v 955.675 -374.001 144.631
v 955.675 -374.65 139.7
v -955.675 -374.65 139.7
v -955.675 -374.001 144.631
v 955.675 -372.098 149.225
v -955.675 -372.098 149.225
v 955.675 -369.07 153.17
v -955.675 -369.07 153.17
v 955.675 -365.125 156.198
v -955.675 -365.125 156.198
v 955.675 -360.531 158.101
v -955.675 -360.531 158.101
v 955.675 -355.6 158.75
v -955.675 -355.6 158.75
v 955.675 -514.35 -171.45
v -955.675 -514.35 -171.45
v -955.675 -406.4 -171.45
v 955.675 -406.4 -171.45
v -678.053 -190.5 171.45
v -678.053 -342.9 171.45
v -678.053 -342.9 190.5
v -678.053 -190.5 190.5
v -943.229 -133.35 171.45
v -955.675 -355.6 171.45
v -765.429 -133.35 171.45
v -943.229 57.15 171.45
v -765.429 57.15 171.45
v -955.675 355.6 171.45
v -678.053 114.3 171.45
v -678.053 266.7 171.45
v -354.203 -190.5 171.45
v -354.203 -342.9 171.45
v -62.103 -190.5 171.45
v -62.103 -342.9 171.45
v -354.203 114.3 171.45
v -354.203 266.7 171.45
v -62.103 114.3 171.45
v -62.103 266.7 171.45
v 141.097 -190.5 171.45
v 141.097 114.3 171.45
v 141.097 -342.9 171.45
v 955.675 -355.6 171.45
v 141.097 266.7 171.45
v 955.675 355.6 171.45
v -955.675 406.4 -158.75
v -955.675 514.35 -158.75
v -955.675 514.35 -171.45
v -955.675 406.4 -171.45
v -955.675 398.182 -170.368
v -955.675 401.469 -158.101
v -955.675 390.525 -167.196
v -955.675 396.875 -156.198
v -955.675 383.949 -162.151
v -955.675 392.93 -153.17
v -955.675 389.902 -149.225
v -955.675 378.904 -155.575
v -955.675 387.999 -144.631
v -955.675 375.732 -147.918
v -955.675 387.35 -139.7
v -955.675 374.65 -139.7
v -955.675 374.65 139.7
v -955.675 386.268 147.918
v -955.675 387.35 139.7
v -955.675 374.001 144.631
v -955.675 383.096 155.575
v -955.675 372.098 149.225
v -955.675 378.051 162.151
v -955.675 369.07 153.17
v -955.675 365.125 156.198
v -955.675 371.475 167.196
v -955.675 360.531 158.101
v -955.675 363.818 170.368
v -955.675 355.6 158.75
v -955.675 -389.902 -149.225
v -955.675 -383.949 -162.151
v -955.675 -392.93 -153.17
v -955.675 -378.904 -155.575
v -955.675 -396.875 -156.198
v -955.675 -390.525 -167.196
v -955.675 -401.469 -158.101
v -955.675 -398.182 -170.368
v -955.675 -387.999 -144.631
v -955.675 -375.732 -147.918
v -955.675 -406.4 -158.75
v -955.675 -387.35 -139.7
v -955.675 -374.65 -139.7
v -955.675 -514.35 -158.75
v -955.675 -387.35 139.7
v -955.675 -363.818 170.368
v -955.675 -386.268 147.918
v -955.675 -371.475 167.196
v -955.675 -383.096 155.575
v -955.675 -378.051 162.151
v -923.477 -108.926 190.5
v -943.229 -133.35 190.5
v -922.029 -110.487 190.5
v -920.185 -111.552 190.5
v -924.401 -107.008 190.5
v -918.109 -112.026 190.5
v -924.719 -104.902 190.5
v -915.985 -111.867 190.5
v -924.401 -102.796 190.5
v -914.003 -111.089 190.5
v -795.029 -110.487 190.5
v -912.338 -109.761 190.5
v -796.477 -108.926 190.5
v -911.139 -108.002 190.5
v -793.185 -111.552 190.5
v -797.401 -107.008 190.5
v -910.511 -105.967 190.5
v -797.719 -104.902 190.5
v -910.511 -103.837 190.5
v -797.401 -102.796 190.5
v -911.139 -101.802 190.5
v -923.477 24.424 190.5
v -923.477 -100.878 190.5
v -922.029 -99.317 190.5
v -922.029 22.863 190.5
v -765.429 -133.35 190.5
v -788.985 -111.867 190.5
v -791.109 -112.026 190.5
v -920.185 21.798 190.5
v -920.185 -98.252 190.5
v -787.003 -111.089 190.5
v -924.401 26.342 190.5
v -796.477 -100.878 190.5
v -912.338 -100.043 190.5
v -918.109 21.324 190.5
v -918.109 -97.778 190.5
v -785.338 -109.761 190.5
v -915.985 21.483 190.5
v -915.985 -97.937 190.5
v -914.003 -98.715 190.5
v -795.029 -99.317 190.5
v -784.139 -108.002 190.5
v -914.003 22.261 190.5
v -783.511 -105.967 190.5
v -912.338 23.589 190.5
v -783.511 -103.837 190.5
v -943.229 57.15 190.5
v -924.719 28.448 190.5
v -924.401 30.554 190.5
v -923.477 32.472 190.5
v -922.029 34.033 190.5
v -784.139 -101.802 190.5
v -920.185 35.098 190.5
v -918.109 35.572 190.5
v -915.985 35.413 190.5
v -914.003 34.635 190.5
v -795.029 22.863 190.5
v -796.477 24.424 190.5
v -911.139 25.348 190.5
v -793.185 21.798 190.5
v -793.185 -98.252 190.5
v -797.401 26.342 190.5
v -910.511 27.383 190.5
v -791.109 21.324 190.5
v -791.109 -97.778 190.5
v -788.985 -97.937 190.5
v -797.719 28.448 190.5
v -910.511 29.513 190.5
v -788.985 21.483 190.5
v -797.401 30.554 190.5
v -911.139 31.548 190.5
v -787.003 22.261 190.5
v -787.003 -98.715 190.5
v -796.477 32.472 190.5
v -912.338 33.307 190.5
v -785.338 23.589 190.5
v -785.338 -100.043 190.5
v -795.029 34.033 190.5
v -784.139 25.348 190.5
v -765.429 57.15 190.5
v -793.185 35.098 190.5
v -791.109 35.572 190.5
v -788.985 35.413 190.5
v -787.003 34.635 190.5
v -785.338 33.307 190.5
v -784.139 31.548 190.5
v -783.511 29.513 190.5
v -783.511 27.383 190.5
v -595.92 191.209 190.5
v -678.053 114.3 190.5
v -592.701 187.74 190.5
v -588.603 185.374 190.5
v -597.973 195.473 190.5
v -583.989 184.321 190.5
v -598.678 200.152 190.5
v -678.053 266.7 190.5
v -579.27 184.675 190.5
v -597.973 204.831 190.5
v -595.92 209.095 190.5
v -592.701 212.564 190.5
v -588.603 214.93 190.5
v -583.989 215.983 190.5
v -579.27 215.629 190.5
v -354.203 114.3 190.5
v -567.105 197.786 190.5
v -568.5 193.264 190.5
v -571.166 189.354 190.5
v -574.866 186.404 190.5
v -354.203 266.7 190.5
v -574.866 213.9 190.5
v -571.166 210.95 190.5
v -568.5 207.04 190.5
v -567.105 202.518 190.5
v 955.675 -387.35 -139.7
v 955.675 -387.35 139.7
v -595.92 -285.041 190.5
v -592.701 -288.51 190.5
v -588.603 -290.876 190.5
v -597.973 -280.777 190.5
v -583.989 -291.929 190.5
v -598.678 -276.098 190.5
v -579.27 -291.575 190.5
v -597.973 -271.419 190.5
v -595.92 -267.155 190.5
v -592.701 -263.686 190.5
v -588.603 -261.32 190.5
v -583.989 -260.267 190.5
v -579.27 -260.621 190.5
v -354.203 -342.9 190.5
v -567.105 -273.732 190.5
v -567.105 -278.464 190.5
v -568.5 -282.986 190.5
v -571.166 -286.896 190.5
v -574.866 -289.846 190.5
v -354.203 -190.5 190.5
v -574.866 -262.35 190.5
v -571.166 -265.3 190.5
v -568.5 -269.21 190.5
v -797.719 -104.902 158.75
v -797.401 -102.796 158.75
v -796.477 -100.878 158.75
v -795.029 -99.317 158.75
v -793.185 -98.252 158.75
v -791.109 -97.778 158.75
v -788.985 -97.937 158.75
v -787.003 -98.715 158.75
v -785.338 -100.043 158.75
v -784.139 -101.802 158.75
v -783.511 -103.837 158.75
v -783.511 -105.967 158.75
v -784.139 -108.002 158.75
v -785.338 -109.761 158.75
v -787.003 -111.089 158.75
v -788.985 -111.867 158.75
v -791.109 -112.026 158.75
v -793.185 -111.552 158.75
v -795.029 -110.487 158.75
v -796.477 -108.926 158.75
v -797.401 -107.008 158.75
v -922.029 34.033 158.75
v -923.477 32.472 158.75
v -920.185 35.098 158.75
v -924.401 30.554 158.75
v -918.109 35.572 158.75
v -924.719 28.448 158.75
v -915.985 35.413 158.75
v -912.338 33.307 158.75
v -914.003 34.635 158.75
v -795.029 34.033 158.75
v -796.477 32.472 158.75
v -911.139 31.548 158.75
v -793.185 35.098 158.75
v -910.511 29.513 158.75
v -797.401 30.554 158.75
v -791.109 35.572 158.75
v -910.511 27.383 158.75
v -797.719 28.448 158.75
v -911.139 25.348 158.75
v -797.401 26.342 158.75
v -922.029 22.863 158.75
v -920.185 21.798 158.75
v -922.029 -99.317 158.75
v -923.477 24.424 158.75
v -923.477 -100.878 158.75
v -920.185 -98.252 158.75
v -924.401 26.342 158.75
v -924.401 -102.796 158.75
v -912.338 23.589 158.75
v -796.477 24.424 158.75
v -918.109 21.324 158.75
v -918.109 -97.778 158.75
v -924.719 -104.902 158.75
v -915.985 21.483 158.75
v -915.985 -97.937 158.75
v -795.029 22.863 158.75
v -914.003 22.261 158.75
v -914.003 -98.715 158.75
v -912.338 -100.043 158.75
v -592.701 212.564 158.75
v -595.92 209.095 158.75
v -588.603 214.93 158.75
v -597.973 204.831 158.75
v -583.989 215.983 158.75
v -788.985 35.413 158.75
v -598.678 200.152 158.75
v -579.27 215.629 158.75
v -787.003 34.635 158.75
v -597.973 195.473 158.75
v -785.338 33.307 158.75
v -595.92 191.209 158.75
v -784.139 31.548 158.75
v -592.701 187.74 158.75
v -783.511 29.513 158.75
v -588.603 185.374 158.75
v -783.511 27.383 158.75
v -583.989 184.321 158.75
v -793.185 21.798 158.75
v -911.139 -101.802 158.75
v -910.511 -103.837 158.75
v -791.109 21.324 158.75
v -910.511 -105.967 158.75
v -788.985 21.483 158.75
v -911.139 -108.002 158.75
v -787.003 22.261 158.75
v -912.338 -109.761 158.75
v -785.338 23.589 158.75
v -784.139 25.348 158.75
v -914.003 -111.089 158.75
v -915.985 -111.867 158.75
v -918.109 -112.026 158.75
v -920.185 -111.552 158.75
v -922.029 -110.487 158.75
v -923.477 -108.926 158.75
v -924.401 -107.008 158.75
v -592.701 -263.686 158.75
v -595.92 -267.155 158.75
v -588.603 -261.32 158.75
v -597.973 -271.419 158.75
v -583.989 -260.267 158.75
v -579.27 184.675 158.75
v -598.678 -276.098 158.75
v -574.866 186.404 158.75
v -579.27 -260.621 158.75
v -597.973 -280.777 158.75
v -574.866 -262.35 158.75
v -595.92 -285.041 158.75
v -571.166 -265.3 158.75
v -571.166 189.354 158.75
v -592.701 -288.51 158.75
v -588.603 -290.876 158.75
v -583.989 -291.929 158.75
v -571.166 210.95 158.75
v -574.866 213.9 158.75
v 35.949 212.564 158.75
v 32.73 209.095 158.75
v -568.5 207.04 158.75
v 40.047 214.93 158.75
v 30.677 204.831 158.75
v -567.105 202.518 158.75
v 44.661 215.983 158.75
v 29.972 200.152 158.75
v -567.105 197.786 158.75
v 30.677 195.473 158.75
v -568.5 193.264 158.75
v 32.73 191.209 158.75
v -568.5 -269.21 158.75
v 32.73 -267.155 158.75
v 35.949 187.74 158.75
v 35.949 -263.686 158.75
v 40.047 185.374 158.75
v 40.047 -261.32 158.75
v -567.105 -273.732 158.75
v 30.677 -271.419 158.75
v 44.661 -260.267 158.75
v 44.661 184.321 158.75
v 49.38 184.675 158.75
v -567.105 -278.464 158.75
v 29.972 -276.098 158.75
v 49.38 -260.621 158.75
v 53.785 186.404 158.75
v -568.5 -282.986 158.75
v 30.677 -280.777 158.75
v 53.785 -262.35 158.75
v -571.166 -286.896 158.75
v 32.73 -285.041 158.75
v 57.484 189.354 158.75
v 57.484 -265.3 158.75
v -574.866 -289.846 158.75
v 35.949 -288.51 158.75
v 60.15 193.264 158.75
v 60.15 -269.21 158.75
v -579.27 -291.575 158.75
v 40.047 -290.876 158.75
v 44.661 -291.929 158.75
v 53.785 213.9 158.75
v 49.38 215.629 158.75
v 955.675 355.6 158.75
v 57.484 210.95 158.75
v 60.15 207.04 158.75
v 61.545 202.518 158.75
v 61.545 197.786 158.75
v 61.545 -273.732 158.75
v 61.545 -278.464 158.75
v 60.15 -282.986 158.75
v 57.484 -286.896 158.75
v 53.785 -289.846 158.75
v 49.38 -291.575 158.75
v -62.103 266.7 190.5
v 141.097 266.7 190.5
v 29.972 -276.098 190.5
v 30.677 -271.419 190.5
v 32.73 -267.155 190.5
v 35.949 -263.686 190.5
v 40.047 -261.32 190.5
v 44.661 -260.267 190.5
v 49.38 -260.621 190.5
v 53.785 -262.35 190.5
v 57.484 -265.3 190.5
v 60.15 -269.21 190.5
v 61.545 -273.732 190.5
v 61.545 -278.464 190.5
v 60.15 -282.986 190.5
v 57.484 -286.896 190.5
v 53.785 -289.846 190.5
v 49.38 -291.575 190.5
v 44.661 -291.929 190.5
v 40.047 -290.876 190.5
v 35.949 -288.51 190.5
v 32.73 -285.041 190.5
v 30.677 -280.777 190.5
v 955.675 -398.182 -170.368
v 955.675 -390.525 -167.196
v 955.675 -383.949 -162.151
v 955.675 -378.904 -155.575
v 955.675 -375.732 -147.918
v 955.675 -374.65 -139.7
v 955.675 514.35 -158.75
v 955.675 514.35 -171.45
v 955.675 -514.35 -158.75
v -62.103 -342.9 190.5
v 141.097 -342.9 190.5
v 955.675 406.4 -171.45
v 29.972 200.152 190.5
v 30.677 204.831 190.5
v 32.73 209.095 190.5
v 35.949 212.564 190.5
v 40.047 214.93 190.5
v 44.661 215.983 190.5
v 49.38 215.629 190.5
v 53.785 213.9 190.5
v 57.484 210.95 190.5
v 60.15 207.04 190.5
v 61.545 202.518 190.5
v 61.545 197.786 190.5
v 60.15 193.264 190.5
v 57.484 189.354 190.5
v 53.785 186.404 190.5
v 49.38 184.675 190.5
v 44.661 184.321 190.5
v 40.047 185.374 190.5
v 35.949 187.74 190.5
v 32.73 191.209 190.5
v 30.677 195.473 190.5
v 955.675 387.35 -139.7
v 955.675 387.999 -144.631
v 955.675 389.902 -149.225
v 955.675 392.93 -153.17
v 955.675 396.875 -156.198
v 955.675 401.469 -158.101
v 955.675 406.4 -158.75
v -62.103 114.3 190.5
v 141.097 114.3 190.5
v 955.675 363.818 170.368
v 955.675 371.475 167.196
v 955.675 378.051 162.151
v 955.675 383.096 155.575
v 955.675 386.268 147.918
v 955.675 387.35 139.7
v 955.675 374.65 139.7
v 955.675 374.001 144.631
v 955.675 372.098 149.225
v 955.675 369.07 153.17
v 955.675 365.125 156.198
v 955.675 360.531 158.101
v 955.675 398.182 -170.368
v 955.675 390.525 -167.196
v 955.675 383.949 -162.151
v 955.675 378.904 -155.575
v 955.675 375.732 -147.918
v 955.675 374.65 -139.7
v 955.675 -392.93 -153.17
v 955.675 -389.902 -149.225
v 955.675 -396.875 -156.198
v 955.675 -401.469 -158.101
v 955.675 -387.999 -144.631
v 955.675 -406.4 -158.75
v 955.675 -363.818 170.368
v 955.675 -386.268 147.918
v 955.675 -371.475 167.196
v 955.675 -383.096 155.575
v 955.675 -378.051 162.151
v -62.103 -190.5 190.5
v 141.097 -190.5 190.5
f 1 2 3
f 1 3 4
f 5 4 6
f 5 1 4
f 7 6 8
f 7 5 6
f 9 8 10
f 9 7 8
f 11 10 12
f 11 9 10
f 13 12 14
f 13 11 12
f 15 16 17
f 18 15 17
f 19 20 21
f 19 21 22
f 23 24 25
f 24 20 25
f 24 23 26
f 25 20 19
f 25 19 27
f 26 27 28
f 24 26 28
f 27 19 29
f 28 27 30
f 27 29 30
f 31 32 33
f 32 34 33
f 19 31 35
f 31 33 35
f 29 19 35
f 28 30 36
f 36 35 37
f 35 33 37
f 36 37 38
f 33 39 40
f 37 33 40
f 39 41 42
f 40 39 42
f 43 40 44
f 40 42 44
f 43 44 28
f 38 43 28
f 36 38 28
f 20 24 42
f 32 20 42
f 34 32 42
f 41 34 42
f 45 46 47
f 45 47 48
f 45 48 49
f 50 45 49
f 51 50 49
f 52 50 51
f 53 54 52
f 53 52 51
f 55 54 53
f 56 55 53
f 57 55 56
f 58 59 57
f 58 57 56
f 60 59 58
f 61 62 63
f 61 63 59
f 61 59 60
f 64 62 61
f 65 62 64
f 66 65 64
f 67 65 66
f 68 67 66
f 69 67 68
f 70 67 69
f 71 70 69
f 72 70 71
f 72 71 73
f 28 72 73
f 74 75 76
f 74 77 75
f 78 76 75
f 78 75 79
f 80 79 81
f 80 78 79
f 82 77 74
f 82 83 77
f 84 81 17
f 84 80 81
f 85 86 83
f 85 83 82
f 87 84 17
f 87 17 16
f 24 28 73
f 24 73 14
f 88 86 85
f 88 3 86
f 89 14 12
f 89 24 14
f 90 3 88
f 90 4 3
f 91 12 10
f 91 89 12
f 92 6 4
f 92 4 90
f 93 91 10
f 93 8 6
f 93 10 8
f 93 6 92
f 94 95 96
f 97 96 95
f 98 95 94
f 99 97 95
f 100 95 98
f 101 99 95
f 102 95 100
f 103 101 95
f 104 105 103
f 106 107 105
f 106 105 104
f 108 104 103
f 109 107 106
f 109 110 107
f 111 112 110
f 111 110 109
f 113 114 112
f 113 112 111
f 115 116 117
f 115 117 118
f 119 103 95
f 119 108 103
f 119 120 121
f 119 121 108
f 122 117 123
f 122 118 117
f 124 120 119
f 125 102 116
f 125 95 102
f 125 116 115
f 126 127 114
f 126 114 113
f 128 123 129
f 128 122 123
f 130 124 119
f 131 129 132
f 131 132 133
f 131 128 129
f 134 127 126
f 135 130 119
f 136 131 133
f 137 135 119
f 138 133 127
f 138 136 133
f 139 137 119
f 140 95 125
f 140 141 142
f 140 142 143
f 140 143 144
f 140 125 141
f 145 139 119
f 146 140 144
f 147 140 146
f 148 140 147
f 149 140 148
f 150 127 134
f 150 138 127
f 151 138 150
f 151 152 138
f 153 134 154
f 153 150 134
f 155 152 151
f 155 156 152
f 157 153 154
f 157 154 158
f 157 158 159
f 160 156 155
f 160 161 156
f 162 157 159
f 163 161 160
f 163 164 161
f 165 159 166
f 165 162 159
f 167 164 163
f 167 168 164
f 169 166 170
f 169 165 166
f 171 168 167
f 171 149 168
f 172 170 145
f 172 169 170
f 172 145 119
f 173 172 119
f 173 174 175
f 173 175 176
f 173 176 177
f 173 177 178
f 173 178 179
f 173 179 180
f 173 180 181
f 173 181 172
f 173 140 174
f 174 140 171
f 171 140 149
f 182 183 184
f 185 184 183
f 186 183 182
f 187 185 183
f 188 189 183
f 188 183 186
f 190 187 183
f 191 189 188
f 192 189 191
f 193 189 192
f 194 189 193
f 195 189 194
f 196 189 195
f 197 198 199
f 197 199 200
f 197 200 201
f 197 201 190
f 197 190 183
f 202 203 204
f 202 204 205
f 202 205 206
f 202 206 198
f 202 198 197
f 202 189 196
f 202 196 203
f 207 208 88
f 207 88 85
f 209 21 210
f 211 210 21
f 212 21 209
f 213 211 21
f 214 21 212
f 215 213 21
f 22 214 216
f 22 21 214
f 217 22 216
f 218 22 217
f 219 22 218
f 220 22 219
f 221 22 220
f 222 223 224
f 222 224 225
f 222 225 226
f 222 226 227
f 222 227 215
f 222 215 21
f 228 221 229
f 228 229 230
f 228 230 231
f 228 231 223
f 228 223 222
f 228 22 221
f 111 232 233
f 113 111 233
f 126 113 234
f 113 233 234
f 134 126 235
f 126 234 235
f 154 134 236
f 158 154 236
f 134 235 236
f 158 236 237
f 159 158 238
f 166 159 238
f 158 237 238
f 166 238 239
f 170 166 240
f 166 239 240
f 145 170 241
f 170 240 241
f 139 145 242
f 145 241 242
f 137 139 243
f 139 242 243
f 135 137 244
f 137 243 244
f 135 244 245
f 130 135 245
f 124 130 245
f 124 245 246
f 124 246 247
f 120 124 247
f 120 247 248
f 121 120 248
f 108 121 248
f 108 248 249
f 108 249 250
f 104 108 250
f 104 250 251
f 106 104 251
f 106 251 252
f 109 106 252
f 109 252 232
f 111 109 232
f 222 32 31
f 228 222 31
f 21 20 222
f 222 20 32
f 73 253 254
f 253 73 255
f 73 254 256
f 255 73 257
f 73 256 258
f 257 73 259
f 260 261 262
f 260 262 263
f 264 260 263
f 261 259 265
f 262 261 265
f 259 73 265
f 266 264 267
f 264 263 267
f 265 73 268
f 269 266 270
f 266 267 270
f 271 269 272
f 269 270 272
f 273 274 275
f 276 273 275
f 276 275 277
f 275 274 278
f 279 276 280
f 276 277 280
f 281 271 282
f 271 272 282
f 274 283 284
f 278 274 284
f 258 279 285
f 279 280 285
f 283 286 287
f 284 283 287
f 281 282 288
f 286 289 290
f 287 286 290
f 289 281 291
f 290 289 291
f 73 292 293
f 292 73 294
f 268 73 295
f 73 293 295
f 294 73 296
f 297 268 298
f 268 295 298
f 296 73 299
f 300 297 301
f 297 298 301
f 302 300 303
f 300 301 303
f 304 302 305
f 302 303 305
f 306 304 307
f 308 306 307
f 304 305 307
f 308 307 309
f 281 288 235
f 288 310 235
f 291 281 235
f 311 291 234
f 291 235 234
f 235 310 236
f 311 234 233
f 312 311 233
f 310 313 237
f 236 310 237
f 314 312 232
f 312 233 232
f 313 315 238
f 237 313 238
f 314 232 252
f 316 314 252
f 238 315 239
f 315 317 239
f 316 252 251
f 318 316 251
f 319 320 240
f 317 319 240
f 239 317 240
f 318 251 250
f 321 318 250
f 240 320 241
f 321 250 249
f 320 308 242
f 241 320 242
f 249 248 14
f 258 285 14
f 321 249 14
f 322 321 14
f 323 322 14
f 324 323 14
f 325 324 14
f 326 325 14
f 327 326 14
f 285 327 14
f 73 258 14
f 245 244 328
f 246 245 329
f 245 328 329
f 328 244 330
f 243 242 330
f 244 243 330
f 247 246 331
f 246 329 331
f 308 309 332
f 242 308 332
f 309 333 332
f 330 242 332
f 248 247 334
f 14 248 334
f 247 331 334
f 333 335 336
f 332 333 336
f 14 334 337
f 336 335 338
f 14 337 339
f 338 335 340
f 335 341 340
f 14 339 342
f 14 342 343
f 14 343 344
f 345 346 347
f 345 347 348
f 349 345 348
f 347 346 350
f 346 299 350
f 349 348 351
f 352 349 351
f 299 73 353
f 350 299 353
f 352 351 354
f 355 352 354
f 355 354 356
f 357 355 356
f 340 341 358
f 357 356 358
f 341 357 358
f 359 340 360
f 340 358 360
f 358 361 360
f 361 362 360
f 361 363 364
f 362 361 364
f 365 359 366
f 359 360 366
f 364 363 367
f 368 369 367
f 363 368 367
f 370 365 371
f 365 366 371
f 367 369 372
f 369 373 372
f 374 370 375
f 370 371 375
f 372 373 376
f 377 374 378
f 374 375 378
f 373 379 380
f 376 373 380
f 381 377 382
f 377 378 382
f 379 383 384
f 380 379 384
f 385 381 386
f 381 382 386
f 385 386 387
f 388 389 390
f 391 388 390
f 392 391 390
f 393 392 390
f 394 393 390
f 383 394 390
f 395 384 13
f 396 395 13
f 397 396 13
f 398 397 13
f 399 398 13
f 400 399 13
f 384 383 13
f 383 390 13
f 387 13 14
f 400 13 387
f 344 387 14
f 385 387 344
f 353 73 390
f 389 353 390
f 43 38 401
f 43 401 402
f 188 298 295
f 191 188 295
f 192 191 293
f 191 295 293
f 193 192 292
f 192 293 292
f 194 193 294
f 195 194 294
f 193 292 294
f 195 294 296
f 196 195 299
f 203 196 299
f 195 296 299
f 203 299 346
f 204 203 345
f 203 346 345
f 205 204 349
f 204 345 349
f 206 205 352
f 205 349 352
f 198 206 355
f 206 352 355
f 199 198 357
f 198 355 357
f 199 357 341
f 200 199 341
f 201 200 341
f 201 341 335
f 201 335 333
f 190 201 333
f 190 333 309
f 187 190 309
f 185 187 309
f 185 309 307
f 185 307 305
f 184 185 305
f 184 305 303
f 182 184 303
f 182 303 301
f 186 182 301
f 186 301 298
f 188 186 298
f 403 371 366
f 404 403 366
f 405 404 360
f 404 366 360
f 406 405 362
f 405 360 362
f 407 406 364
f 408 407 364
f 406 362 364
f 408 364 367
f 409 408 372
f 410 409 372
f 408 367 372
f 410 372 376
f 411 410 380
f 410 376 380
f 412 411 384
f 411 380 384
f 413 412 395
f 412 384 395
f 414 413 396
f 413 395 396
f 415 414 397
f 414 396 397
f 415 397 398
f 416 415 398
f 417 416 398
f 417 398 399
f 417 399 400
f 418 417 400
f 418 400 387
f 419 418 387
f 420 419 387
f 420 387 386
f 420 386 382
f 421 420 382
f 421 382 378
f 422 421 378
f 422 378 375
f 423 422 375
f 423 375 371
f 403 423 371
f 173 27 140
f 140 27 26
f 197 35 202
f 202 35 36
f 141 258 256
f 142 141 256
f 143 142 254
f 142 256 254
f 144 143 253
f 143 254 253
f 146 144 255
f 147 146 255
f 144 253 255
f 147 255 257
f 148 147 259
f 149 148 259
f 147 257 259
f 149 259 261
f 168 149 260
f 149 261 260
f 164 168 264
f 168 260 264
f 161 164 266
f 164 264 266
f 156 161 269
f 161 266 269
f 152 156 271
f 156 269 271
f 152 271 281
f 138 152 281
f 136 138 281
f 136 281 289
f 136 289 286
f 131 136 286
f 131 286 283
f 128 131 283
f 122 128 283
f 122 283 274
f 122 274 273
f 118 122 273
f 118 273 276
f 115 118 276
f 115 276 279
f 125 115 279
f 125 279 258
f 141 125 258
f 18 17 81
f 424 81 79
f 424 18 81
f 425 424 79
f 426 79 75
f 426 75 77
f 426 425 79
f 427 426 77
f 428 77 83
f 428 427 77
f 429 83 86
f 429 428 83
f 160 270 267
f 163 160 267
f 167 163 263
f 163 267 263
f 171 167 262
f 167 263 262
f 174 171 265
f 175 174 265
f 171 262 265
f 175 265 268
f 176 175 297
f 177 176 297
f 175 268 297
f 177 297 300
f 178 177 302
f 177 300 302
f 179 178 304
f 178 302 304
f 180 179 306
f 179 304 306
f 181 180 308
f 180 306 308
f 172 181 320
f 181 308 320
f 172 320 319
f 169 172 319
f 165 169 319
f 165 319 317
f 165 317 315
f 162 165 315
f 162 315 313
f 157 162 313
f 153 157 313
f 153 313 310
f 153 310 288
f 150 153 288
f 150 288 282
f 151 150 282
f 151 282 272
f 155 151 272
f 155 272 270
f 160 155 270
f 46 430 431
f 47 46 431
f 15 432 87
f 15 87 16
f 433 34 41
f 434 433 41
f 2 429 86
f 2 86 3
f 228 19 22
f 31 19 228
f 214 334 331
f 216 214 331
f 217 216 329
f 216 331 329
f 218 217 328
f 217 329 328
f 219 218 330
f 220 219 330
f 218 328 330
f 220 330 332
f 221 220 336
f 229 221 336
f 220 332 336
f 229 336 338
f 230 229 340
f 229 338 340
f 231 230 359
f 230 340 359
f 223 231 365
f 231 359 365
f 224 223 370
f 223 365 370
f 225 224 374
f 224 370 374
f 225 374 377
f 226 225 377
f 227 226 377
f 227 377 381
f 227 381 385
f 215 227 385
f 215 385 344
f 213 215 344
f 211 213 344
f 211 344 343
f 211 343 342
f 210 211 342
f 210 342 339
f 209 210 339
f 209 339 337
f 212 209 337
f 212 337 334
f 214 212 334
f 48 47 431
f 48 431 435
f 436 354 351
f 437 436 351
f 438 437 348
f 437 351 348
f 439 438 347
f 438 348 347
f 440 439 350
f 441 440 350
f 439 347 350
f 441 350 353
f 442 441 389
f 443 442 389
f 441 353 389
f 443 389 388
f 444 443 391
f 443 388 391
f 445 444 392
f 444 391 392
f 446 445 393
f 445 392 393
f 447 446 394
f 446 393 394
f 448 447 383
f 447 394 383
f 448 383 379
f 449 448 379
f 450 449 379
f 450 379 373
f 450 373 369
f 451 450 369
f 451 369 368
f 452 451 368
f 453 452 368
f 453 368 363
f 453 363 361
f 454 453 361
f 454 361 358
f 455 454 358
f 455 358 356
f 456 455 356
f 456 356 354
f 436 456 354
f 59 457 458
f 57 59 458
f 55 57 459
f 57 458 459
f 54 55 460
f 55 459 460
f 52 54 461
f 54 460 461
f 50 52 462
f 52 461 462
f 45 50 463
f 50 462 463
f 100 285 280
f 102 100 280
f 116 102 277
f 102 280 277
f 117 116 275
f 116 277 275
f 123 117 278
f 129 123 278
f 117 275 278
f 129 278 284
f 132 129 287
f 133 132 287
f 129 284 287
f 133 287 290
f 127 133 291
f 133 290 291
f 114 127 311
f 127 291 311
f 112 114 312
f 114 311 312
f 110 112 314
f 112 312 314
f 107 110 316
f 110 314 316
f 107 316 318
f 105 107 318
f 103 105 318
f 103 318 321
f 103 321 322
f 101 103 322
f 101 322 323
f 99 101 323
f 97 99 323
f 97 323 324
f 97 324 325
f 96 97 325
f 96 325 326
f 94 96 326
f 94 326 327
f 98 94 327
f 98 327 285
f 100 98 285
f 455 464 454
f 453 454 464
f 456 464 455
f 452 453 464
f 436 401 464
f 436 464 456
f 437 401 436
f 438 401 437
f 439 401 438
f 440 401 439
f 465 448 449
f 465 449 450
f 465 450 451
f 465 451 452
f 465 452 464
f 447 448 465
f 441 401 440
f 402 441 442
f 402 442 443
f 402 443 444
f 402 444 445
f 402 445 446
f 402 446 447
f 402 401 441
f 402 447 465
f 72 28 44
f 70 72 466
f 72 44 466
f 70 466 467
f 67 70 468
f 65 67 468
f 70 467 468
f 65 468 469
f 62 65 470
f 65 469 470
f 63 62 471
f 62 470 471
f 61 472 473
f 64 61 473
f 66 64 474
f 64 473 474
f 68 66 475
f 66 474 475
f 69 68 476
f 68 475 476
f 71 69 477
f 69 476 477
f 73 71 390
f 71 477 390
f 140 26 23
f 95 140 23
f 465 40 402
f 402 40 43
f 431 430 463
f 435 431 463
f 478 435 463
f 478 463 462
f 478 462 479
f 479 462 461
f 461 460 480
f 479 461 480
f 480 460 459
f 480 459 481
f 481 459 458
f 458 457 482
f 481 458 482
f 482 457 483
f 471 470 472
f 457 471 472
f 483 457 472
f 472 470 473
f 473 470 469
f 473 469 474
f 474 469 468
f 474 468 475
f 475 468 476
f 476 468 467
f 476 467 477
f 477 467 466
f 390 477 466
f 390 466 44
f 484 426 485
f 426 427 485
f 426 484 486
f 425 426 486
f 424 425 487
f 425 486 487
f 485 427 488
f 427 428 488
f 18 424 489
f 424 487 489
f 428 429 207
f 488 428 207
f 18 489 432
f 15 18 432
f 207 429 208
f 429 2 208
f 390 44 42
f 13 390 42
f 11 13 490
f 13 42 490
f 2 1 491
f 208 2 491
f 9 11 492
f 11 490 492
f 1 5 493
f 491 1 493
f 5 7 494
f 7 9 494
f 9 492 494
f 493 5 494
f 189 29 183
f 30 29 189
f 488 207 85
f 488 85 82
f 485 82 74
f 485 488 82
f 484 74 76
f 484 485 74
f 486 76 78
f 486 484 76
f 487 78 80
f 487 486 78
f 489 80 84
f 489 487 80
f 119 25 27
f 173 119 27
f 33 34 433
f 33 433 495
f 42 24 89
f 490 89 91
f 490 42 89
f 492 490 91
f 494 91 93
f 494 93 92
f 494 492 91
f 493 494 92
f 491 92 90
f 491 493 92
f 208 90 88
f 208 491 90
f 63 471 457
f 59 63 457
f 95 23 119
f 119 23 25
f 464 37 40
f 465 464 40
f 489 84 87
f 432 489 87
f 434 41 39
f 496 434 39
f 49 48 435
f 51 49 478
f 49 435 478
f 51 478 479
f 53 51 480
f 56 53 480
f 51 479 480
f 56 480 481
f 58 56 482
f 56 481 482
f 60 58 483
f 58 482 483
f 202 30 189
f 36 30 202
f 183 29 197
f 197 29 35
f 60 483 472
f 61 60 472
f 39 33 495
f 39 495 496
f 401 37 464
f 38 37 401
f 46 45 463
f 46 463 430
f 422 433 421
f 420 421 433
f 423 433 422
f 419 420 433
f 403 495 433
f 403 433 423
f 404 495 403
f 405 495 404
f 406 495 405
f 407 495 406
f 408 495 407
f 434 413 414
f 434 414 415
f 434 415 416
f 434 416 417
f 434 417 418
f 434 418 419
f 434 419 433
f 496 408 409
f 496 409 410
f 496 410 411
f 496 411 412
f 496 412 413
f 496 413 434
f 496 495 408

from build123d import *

# Parameters (mm, degrees)
F1_DEPTH = 955.675
F3_W     = 203.2
F3_H     = 152.4
F3_W_2   = 323.85
F4_DEPTH = 19.05
F6_D     = 31.75
F8_DEPTH = 19.05
F10_D    = 14.2875


with BuildPart() as f1:
    # F0 (on Right) → F1 (new body, symmetric)
    with BuildSketch(Plane.YZ):
        with BuildLine():
            Line((0, 171.45), (-355.6, 171.45))
            ThreePointArc((-355.6, 171.45), (-378.05064, 162.15064), (-387.35, 139.7))
            Line((-387.35, 139.7), (-387.35, -139.7))
            ThreePointArc((-387.35, -139.7), (-392.929616, -153.170384), (-406.4, -158.75))
            Line((-406.4, -158.75), (-514.35, -158.75))
            Line((-514.35, -158.75), (-514.35, -171.45))
            Line((-514.35, -171.45), (-406.4, -171.45))
            ThreePointArc((-406.4, -171.45), (-383.94936, -162.15064), (-374.65, -139.7))
            Line((-374.65, -139.7), (-374.65, 139.7))
            ThreePointArc((-374.65, 139.7), (-369.070384, 153.170384), (-355.6, 158.75))
            Line((-355.6, 158.75), (0, 158.75))
            Line((0, 158.75), (0, 171.45))
        make_face()
    extrude(amount=F1_DEPTH, both=True)

    # F2: F1 across plane


with BuildPart() as f1_1:
    add(f1.part)
    add(f1.part.mirror(Plane.XZ))

    # F3 (on face) → F4 (join)
    with BuildSketch(Plane.XY.offset(171.45)):
        with Locations((39.497, -266.7)):
            Rectangle(F3_W, F3_H)
        with Locations((39.497, 190.5)):
            Rectangle(F3_W, F3_H)
        with Locations((-516.128, -266.7)):
            Rectangle(F3_W_2, F3_H)
        with Locations((-516.128, 190.5)):
            Rectangle(F3_W_2, F3_H)
    extrude(amount=F4_DEPTH)

    # F6 (through all)
    with Locations(Plane.XY.offset(190.5)):
        with Locations((-582.803, 200.152), (-582.803, -276.098), (45.847, 200.152), (45.847, -276.098)):
            Hole(F6_D / 2)

    # F7 (on face) → F8 (join)
    with BuildSketch(Plane.XY.offset(171.45)):
        Polygon((-765.429, -133.35), (-765.429, -38.1), (-765.429, 57.15), (-943.229, 57.15), (-943.229, -38.1), (-943.229, -133.35), align=None)
    extrude(amount=F8_DEPTH)

    # F10 (through all)
    with Locations(Plane.XY.offset(190.5)):
        with Locations((-917.575, 28.448), (-790.575, 28.448), (-917.575, -104.902), (-790.575, -104.902)):
            Hole(F10_D / 2)


solid = f1_1.part
